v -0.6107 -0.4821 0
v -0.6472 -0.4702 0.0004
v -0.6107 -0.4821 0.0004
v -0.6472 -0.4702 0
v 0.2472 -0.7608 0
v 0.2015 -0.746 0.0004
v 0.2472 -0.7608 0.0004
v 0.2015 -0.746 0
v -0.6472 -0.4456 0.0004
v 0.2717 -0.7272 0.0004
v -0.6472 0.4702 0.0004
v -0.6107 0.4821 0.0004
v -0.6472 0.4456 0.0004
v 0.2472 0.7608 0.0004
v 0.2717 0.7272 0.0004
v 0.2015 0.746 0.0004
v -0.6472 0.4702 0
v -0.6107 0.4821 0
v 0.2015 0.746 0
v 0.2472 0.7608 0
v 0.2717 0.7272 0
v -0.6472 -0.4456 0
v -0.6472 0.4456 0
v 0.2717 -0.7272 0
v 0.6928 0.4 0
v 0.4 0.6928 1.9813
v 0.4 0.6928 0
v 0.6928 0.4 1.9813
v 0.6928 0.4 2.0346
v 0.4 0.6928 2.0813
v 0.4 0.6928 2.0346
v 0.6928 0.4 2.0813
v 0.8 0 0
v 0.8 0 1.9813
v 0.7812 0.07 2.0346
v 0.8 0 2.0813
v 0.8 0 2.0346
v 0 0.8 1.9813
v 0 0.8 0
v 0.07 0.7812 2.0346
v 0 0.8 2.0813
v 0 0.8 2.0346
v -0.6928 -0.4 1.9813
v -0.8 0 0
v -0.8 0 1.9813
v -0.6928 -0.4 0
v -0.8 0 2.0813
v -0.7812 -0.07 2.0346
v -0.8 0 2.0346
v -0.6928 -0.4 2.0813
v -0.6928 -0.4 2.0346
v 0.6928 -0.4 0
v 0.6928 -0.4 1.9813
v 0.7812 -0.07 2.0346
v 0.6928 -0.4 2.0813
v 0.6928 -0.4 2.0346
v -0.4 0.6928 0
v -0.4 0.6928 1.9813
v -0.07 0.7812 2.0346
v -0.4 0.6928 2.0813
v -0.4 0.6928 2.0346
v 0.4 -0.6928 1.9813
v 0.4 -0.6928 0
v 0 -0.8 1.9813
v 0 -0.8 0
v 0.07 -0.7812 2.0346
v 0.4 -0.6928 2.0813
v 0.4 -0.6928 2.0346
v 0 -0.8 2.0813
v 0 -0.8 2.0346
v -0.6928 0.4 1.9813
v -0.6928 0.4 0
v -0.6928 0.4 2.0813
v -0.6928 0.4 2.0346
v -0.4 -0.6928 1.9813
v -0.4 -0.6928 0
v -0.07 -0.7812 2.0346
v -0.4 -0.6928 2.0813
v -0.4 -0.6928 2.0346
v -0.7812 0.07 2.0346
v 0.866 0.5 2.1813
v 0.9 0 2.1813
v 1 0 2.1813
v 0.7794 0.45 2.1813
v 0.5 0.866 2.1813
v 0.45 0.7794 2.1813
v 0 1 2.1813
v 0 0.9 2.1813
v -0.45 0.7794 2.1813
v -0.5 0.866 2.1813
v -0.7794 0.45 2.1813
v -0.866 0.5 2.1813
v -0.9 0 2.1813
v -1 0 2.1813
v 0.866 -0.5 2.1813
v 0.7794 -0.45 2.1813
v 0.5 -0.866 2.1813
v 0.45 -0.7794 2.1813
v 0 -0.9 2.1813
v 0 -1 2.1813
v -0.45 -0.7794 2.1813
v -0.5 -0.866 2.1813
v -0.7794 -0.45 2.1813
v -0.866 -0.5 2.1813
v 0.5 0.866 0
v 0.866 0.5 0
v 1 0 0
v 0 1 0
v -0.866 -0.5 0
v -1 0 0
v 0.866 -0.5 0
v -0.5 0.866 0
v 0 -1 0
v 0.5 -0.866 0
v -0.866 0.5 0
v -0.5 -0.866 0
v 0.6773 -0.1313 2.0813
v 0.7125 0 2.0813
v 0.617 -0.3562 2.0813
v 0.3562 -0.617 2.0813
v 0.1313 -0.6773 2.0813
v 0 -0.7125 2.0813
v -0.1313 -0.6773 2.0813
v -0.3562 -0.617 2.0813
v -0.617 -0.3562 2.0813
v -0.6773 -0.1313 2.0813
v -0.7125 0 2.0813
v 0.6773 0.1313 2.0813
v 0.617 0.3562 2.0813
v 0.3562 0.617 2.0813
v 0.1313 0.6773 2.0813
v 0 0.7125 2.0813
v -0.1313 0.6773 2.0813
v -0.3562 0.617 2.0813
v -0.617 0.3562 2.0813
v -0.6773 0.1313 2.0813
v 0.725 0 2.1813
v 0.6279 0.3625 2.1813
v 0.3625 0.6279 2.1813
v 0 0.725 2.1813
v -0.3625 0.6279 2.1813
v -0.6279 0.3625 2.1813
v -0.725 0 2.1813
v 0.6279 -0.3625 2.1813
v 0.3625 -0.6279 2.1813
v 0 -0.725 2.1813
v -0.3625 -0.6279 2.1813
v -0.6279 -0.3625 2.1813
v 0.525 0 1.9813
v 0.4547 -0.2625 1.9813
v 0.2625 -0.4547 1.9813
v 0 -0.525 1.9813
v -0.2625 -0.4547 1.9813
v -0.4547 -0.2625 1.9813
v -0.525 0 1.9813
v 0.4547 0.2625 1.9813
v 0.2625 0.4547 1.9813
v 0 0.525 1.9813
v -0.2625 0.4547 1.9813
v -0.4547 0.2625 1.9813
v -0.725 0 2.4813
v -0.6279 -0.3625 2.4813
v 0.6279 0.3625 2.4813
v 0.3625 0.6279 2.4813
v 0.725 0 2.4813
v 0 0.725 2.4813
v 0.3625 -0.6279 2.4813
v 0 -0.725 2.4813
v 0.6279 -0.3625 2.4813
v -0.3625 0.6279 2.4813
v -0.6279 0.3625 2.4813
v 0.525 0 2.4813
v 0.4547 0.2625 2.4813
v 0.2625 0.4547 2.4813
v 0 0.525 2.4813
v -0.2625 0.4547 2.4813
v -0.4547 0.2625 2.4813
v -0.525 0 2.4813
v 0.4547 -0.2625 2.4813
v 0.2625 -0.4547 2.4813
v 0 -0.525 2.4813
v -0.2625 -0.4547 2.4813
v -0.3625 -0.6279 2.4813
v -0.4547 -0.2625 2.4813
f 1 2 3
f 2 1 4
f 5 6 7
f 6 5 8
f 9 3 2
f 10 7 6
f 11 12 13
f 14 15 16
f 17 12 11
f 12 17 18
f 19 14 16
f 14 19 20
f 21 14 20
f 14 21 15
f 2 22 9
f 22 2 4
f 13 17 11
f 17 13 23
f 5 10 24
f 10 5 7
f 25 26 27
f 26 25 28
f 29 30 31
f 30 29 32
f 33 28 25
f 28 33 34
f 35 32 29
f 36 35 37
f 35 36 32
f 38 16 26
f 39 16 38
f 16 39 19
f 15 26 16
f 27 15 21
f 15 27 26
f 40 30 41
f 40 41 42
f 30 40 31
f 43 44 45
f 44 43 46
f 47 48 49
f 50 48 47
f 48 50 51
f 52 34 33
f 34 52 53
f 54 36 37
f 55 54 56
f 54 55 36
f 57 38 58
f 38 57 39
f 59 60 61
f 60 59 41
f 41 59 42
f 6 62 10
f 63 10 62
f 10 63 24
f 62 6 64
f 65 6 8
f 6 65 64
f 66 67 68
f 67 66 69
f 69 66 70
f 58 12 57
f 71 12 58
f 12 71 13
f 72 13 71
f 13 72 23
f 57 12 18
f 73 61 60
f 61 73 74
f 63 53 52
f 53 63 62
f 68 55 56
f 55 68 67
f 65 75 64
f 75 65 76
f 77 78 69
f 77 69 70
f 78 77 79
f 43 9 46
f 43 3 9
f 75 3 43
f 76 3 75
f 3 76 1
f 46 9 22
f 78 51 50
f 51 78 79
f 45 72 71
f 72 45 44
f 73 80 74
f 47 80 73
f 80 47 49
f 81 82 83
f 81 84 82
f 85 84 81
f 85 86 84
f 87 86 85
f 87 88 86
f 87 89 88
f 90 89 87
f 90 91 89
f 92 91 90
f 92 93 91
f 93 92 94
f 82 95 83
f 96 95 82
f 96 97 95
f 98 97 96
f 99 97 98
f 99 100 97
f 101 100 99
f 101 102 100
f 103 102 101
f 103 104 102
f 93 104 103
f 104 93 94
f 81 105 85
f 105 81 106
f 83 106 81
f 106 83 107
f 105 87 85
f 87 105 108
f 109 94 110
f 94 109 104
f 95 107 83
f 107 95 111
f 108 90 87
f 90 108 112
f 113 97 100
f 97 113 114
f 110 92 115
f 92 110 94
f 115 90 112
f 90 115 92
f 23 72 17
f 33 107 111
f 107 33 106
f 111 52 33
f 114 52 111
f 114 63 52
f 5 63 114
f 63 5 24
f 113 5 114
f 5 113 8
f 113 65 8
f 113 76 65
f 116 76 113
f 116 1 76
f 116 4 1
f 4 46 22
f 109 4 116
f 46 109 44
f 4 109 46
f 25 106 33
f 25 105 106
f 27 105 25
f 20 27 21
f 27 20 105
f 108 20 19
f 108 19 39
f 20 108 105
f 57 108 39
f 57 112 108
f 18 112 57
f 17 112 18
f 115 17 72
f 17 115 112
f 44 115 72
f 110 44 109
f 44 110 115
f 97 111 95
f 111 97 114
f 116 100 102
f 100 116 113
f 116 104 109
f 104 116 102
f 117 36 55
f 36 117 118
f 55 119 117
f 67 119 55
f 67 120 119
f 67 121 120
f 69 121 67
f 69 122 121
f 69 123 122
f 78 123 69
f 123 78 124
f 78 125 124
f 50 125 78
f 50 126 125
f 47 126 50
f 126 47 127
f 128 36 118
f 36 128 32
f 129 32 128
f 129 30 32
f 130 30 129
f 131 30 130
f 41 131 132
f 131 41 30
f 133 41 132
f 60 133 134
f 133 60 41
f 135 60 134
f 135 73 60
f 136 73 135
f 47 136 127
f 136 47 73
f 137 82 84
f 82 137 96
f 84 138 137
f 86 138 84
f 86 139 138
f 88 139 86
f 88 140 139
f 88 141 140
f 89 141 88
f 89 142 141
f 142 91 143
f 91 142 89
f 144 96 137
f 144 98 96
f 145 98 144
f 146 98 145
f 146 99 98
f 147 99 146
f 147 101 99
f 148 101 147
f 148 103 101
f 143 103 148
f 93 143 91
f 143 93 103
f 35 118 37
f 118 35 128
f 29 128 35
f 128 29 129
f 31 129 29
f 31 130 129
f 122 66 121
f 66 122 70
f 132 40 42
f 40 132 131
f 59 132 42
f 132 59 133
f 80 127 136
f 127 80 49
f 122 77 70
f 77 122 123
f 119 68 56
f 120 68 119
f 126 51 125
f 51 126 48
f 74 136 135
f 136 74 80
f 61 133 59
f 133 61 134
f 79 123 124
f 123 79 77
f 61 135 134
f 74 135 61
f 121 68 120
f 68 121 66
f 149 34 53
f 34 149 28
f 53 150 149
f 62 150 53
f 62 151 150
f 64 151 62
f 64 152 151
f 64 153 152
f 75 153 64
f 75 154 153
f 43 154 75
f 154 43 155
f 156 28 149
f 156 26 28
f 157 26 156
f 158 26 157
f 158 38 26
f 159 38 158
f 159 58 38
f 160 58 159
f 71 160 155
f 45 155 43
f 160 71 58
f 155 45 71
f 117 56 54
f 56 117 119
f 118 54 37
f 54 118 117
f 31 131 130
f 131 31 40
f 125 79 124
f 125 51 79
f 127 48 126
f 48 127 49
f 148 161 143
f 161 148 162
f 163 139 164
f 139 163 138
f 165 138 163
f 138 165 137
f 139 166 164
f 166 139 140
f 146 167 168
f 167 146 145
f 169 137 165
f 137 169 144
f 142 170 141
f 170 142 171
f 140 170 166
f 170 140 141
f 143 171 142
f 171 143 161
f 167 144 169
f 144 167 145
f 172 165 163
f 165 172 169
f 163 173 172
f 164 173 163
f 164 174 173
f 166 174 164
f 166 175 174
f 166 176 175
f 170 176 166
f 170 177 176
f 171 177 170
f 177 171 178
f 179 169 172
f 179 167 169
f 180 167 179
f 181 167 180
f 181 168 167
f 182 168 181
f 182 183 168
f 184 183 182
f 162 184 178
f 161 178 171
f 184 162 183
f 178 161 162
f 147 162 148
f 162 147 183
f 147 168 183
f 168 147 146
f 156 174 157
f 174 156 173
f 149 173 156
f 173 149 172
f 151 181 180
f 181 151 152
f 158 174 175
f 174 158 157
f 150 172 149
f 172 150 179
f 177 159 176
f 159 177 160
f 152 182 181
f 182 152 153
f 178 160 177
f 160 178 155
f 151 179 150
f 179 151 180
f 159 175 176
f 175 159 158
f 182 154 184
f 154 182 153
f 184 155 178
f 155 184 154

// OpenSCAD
tolerance=0.075;
hole_radius=0.075;
grid_hole_radius=0.075;
outer_radius=1;
thickness=0.2;
hole_attach_height=0.075;
attach_thickness=0.1;

//parameters that don't have to be defined explicitly
eps = tolerance/100;
inner_radius = outer_radius - thickness;
fn = 12;
fnh = 6;

module angled_cylinder(angle_deg_y, _h, _r, angle_deg_x = 0) {
    rotate([angle_deg_x, angle_deg_y, 0]) { // Rotate the cylinder 
            cylinder(h = _h, r = _r, center = true, $fn = fnh);
        }
}

module hole(_h) {
    cylinder(h = _h, r = grid_hole_radius, $fn = fnh);
}

//makes circle of holes
module circular_grid(_h, _r, _n) {
    for (i = [0:_n-1]) {
        angle = i * 360 / _n;
        x_pos = _r * cos(angle);
        y_pos = _r * sin(angle);
        translate([x_pos, y_pos, -eps]) {
            hole(_h);
        }
    }
}

//makes grid of holes
module hole_grid(hole_height, grid_h) {
    translate([0,0,hole_height]) {
        difference() {
            //cylinder
            cylinder(h = grid_h, r = (inner_radius + outer_radius)/2, 
                center=false, $fn = fn);
            //holes
            for (i = [0 : grid_hole_radius * 2 + hole_attach_height : inner_radius - grid_hole_radius * 2]) {
                circular_grid(grid_h + eps*2, i, ceil(6.28*i/(grid_hole_radius*4)));
            }
            
        } 
    }
}

//makes curve of CSC
module curve(_radius, _twist, _turning_angle, _turning_radius) {
    rotate([90,0,_twist])
    translate([-_turning_radius, 0, 0])
    rotate_extrude(angle=_turning_angle, convexity=100, $fn = fn)
    translate([_turning_radius, 0]) circle(_radius);
}

module CSC(_r, _t1, _ta1, _tr1, _h, _t2, _ta2, _tr2, is_inner) {
    
    if (_ta1 > 90) {
        CSC(_r, _t1, 90, _tr1, 0, 0, 0, 0, is_inner);
        
        pos1 = (-_tr1 + sqrt(_tr1*_tr1 - pow(_tr1,2)));
        translate([pos1*cos(_t1),pos1*sin(_t1),_tr1])
        rotate([0,-90,_t1])
        CSC(_r, 0, _ta1 - 90, _tr1, _h, _t2, _ta2, _tr2, is_inner);
    } else if (_ta2 > 90) {
        CSC(_r, _t1, _ta1, _tr1, _h, _t2, 90, _tr2, is_inner);
        
        pos1 = (-_tr1 + sqrt(_tr1*_tr1 - pow(_tr1*sin(_ta1),2)));
        pos2 = (-_tr2 + sqrt(_tr2*_tr2 - pow(_tr2,2)));
        translate([pos1*cos(_t1),pos1*sin(_t1),_tr1*sin(_ta1)])
        rotate([0,-_ta1,_t1])
        translate([0, 0, _h])
        translate([pos2*cos(_t2),pos2*sin(_t2),_tr2])
        rotate([0,-90,_t2])
        CSC(_r, 0, 0, 0, 0, 0, _ta2 - 90, _tr2, is_inner);
    } else {
        //intermediate positions
        pos1 = (-_tr1 + sqrt(_tr1*_tr1 - pow(_tr1*sin(_ta1),2)));
        pos2 = (-_tr2 + sqrt(_tr2*_tr2 - pow(_tr2*sin(_ta2),2)));
        
        union() {
            //bottom shell threshold
            if (is_inner) {
                cylinder(h=eps, r=_r, center=true);
            }
            
            //first curve of CSC
            curve(_r, _t1, _ta1, _tr1);
            
            //straight link of CSC
            translate([pos1*cos(_t1),pos1*sin(_t1),_tr1*sin(_ta1)])
            rotate([0,-_ta1,_t1])
            if (is_inner) {
                //add threshold for shelling
                translate([0,0,-eps /2])
                cylinder(h=_h + eps,r=_r, center = false, $fn= fn);
            } else {
                cylinder(h=_h,r=_r, center = false, $fn= fn);
            }
            
            //second curve of CSC
            translate([pos1*cos(_t1),pos1*sin(_t1),_tr1*sin(_ta1)])
            rotate([0,-_ta1,_t1])
            translate([0, 0, _h])
            curve(_r, _t2, _ta2, _tr2);
            
            //shelling thresholds
            if (is_inner) {
                translate([pos1*cos(_t1),pos1*sin(_t1),_tr1*sin(_ta1)])
                rotate([0,-_ta1,_t1])
                translate([0, 0, _h])
                translate([pos2*cos(_t2),pos2*sin(_t2),_tr2*sin(_ta2)])
                rotate([0,-_ta2,_t2]) {
                    cylinder(h=eps, r=_r, center=true,$fn=fn);
                }
            
            }
        }
    }
    
}

//allow modules to attach
module CSC_ATTACH(_r, _t1, _ta1, _tr1, _h, _t2, _ta2, _tr2, next_hole_radius, next_hole_attach_height, next_inner) {
    
    if (_ta1 > 90) {        
        pos1 = (-_tr1 + sqrt(_tr1*_tr1 - pow(_tr1,2)));
        translate([pos1*cos(_t1),pos1*sin(_t1),_tr1])
        rotate([0,-90,_t1])
        CSC_ATTACH(_r, 0, _ta1 - 90, _tr1, _h, _t2, _ta2, _tr2, next_hole_radius, next_hole_attach_height, next_inner);
    } else if (_ta2 > 90) {        
        pos1 = (-_tr1 + sqrt(_tr1*_tr1 - pow(_tr1*sin(_ta1),2)));
        pos2 = (-_tr2 + sqrt(_tr2*_tr2 - pow(_tr2,2)));
        translate([pos1*cos(_t1),pos1*sin(_t1),_tr1*sin(_ta1)])
        rotate([0,-_ta1,_t1])
        translate([0, 0, _h])
        translate([pos2*cos(_t2),pos2*sin(_t2),_tr2])
        rotate([0,-90,_t2])
        CSC_ATTACH(_r, 0, 0, 0, 0, 0, _ta2 - 90, _tr2, next_hole_radius, next_hole_attach_height, next_inner);
    } else {
        //intermediate positions
        pos1 = (-_tr1 + sqrt(_tr1*_tr1 - pow(_tr1*sin(_ta1),2)));
        pos2 = (-_tr2 + sqrt(_tr2*_tr2 - pow(_tr2*sin(_ta2),2)));
        
        translate([pos1*cos(_t1),pos1*sin(_t1),_tr1*sin(_ta1)])
        rotate([0,-_ta1,_t1])
        translate([0, 0, _h])
        translate([pos2*cos(_t2),pos2*sin(_t2),_tr2*sin(_ta2)])
        rotate([0,-_ta2,_t2]) {
            difference() {
                union() {
                    //attachment for smaller cylinder
                    translate([0,0,-attach_thickness])
                    cylinder(h=attach_thickness, r=_r - thickness/2, $fn=fn);
                    translate([0,0,-attach_thickness*2])
                    cylinder(h=attach_thickness*2, r1=_r - thickness/2, r2=next_inner - tolerance - thickness, $fn=fn);
                    
                    //small cylinder
                    cylinder(h=next_hole_radius*2 + next_hole_attach_height * 2, r = next_inner - tolerance, $fn=fn);
                }
                
                //shelling
                translate([0,0, -attach_thickness*2 - eps/2])
                cylinder(h=next_hole_radius*2 + next_hole_attach_height * 2 + attach_thickness*2 + eps, r = min(inner_radius, next_inner - tolerance - thickness), $fn=fn);
                
                //holes for screws
    //            translate([0,0,next_hole_attach_height + next_hole_radius]) {
    //                angled_cylinder(0, (next_inner + thickness + eps) * 2,  hole_radius, 90);
    //                angled_cylinder(90, (next_inner + thickness + eps) * 2, hole_radius, 0);
    //            }
            }
        }
    }
}

//remove overlap to allow all branches to attach to each other
module CSC_REMOVE_OVERLAP(_r, _t1, _ta1, _tr1, _h, _t2, _ta2, _tr2, next_hole_radius, next_hole_attach_height, next_inner) {
    if (_ta1 > 90) {        
        pos1 = (-_tr1 + sqrt(_tr1*_tr1 - pow(_tr1,2)));
        translate([pos1*cos(_t1),pos1*sin(_t1),_tr1])
        rotate([0,-90,_t1])
        CSC_REMOVE_OVERLAP(_r, 0, _ta1 - 90, _tr1, _h, _t2, _ta2, _tr2, next_hole_radius, next_hole_attach_height, next_inner);
    } else if (_ta2 > 90) {        
        pos1 = (-_tr1 + sqrt(_tr1*_tr1 - pow(_tr1*sin(_ta1),2)));
        pos2 = (-_tr2 + sqrt(_tr2*_tr2 - pow(_tr2,2)));
        translate([pos1*cos(_t1),pos1*sin(_t1),_tr1*sin(_ta1)])
        rotate([0,-_ta1,_t1])
        translate([0, 0, _h])
        translate([pos2*cos(_t2),pos2*sin(_t2),_tr2])
        rotate([0,-90,_t2])
        CSC_REMOVE_OVERLAP(_r, 0, 0, 0, 0, 0, _ta2 - 90, _tr2, next_hole_radius, next_hole_attach_height, next_inner);
    } else {
        pos1 = (-_tr1 + sqrt(_tr1*_tr1 - pow(_tr1*sin(_ta1),2)));
        pos2 = (-_tr2 + sqrt(_tr2*_tr2 - pow(_tr2*sin(_ta2),2)));
        
        translate([pos1*cos(_t1),pos1*sin(_t1),_tr1*sin(_ta1)])
        rotate([0,-_ta1,_t1])
        translate([0, 0, _h])
        translate([pos2*cos(_t2),pos2*sin(_t2),_tr2*sin(_ta2)])
        rotate([0,-_ta2,_t2]) {
            cylinder(h=999999, r=_r + tolerance, $fn=fn);
        }
    }
}

//c is _t1, _ta1, _tr1, _h, _t2, _ta2, _tr2, next hole radius, next hole height, next inner radius
module branch(branch_list, _outer, _inner) {
    union() {
        //make grid of holes
        //hole_grid(hole_radius*2 + hole_attach_height * 2, grid_hole_radius);
        
        //make CSC shells for each CSC in branch_list
        difference() {
            for (c = branch_list) {
                CSC(_outer,c[0],c[1],c[2],c[3],c[4],c[5],c[6], false);
            }
            
            for (c = branch_list) {
                CSC(_inner,c[0],c[1],c[2],c[3],c[4],c[5],c[6], true);
                CSC_REMOVE_OVERLAP(_outer,c[0],c[1],c[2],c[3],c[4],c[5],c[6],c[7], c[8], c[9]);
            }
            
            //make screw holes at the bottom
//            translate([0,0,hole_radius + hole_attach_height]) {
//                angled_cylinder(0, (outer_radius*1.5 + eps) * 2,  hole_radius, 90);
//                angled_cylinder(90, (outer_radius*1.5 + eps) * 2, hole_radius, 0);
//            }    
        }
        for (c=branch_list) {     
            CSC_ATTACH(_outer,c[0],c[1],c[2],c[3],c[4],c[5],c[6], c[7], c[8], c[9]);
        }
    }
}

branch([
[ 0.0, 0.0, 1.0*outer_radius, 2.1813*outer_radius, 0.0, 0.0, 1.0*outer_radius, 0.075, 0.075, 0.8],
],outer_radius,inner_radius);
